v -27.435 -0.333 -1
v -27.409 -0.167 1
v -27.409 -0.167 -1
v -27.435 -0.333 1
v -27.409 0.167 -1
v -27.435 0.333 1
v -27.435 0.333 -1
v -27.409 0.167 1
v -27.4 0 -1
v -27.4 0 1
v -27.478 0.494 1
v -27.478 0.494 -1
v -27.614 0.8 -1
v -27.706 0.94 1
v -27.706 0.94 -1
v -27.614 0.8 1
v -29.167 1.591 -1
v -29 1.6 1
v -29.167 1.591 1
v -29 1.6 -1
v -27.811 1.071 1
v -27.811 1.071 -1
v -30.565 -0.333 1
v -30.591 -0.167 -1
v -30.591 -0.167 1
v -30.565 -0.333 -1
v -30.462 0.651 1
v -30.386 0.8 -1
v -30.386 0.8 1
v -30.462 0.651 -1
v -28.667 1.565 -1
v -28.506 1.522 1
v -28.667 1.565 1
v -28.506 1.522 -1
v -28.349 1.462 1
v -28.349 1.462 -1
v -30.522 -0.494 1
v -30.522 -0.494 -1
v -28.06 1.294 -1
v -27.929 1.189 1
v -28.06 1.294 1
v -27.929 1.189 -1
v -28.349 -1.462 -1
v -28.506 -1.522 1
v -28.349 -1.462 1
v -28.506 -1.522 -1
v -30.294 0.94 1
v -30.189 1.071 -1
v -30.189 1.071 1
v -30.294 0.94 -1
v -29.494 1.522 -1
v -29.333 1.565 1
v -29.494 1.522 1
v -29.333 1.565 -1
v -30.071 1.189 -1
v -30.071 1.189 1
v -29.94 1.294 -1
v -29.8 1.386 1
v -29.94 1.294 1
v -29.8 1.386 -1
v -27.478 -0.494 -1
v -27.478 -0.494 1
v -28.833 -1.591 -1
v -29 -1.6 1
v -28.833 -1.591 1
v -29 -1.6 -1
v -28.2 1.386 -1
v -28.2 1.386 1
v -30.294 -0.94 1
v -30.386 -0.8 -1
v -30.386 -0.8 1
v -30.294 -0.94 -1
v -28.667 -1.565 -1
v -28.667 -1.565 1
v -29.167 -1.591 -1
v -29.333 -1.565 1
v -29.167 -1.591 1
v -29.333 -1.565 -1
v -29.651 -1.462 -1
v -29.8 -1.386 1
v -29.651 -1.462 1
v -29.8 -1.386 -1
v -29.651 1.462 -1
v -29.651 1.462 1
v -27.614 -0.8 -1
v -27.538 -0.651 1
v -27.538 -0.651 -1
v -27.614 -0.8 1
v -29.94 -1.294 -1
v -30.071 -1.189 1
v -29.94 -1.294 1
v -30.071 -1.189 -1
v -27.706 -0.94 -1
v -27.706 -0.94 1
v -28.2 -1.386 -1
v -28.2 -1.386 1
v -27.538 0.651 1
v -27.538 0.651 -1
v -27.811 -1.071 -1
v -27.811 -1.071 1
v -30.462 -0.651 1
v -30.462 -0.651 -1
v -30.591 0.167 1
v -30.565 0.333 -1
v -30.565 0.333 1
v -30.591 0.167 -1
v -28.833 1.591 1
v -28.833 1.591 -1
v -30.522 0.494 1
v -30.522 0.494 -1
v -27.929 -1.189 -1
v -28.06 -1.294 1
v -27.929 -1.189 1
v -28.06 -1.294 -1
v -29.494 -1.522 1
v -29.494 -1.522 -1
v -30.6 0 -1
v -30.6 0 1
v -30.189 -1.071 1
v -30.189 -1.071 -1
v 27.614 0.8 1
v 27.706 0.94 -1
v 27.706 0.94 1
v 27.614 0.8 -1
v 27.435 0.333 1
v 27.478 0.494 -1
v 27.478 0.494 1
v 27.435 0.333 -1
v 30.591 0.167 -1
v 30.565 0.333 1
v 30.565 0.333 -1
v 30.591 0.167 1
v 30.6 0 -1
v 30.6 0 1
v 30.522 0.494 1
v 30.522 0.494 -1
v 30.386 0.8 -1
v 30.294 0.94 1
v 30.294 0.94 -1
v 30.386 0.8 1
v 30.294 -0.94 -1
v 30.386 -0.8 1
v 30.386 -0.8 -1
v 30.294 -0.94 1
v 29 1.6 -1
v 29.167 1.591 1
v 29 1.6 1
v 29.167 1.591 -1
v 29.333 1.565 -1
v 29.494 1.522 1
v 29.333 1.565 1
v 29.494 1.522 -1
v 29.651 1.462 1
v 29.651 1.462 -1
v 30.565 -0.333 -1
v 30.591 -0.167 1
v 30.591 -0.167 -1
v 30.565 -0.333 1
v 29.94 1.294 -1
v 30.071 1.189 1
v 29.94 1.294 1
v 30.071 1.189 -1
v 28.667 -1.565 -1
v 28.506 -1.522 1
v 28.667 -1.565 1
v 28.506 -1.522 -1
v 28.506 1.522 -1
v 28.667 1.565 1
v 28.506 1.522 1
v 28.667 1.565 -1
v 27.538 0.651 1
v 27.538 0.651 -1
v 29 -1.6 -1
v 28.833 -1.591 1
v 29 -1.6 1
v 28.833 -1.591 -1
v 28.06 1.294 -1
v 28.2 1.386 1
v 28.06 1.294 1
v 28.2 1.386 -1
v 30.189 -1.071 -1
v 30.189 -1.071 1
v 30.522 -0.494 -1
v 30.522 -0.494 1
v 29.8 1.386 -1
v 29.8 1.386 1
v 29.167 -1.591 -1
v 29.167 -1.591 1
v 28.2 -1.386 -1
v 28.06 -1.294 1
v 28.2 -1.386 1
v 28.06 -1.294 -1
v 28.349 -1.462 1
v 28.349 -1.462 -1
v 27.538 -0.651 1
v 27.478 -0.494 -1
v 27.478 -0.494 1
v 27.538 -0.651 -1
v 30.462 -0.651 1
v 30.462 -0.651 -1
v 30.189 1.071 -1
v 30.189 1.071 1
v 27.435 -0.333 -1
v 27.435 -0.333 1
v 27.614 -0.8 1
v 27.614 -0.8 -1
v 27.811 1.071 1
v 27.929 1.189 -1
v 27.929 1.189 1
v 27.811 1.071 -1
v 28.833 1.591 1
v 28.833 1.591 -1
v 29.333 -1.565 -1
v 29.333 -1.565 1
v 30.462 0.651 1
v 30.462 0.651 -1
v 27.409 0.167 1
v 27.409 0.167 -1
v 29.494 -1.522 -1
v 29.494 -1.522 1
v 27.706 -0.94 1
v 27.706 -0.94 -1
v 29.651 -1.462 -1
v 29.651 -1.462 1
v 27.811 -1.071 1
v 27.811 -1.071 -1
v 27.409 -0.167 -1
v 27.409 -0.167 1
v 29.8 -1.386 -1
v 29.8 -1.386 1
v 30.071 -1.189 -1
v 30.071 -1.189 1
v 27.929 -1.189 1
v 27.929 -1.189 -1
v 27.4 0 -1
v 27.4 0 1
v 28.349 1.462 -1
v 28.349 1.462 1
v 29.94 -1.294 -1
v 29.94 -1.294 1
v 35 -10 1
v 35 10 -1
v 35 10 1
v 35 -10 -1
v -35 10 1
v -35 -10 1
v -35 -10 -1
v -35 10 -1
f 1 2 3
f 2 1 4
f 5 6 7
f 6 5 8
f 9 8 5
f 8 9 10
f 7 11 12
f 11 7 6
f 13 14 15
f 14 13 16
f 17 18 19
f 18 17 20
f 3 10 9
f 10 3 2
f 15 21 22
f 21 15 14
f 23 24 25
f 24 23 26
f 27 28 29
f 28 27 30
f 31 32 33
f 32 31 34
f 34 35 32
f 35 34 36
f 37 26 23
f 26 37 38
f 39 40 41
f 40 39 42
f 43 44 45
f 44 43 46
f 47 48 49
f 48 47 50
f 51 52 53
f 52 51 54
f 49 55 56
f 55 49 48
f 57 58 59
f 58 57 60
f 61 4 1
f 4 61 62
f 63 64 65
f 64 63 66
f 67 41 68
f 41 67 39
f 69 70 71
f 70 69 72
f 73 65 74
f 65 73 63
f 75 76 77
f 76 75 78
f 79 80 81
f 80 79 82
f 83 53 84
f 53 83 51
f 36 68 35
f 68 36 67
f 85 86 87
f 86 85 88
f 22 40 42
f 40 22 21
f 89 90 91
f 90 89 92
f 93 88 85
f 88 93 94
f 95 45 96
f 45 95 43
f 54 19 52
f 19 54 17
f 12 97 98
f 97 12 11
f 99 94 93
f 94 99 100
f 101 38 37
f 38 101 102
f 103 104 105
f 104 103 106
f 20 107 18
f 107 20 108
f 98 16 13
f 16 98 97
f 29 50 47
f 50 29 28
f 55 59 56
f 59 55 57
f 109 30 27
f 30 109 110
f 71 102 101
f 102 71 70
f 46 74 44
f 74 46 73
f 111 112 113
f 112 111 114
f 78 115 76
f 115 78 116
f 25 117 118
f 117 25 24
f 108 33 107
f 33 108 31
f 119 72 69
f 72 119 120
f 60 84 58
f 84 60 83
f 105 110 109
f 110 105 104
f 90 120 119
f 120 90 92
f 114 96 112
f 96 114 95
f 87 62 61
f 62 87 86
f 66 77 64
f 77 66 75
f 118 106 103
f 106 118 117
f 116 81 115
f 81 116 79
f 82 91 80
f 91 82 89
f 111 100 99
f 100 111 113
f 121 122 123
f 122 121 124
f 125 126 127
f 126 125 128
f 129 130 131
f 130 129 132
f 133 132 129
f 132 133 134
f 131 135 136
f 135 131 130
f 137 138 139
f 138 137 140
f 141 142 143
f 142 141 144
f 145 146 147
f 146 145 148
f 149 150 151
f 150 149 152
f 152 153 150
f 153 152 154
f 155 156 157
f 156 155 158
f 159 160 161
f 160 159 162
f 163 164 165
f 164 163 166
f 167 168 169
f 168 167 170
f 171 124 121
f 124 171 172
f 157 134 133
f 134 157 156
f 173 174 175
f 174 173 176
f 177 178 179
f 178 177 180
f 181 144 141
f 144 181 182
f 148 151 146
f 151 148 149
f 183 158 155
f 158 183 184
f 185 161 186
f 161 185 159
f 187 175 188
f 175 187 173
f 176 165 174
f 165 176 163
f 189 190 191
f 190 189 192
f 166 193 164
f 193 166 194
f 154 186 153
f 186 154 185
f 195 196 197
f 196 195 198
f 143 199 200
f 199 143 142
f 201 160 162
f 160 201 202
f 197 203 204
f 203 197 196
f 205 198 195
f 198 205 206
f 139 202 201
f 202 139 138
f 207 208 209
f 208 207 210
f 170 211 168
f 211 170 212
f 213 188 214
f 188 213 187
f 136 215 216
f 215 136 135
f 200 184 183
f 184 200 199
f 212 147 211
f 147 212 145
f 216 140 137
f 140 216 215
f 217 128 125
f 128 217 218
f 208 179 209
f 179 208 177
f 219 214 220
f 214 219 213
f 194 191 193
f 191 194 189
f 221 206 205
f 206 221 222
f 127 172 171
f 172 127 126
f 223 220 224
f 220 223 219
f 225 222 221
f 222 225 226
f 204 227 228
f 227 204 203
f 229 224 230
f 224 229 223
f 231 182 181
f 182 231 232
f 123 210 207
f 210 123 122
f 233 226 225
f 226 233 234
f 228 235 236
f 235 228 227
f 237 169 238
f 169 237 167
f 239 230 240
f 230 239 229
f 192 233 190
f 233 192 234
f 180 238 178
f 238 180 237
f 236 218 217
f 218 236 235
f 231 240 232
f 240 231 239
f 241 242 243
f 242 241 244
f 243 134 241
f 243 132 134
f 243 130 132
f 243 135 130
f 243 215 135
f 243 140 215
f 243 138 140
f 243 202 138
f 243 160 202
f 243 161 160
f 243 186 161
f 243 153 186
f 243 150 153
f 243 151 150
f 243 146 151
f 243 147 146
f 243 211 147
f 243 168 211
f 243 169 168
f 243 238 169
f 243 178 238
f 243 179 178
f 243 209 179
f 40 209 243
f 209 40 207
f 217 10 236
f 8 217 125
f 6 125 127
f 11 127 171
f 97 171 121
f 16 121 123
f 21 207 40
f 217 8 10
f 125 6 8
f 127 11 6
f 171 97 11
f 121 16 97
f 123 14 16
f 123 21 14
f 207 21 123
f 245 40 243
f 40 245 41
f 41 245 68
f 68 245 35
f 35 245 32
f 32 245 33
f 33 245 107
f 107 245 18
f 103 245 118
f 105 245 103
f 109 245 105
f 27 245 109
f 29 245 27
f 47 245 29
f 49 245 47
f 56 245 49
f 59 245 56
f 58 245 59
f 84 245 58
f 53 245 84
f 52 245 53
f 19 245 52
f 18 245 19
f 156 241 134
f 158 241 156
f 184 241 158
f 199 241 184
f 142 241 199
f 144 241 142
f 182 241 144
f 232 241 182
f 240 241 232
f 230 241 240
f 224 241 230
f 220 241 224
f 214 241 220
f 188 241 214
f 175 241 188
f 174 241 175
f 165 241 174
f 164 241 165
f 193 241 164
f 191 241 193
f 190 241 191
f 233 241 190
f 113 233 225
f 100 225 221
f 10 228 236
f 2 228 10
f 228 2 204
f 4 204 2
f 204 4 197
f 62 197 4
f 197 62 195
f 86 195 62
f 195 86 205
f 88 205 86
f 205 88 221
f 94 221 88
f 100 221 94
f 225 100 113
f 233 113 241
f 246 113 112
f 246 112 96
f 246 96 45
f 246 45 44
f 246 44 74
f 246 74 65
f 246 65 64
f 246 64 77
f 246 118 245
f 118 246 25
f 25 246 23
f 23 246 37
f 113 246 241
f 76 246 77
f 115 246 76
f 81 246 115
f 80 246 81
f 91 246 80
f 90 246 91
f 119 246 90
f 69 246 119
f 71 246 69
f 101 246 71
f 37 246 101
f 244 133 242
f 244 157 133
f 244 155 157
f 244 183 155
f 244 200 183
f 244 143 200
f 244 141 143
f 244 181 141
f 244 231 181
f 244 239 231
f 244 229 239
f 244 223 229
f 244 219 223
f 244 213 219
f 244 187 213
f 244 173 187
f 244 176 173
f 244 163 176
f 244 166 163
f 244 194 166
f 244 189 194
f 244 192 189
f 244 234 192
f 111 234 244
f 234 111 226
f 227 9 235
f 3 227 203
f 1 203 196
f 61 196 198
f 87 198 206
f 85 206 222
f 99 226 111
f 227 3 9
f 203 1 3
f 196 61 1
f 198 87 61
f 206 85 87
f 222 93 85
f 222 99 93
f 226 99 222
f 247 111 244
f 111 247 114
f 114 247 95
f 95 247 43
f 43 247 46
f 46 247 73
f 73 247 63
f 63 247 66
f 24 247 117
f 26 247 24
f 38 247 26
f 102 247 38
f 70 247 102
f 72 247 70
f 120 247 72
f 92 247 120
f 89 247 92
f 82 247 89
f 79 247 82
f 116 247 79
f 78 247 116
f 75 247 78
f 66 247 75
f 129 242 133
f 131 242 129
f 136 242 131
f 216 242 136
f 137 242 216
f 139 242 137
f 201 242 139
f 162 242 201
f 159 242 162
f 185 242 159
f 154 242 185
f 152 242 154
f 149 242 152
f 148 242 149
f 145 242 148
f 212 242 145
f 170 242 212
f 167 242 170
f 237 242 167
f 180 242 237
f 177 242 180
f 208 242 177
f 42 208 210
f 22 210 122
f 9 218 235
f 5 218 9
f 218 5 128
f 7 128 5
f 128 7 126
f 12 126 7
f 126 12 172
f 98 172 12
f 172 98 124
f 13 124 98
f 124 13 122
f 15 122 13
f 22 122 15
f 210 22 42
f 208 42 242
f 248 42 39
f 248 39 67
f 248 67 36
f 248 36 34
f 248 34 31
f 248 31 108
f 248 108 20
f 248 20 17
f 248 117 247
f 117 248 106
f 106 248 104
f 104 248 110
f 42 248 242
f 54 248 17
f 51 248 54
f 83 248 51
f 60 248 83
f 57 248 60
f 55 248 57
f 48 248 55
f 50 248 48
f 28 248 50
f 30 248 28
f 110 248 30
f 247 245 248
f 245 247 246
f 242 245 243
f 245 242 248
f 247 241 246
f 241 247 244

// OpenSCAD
// Engraving-ready nameplate.
$fn = 60;
eps = 0.02;
length = 70;
width = 20;
thickness = 2;
difference() { cube([length,width,thickness],center=true); for(x=[-length/2+6,length/2-6]) translate([x,0,-thickness/2-eps]) cylinder(d=3.2,h=thickness+2*eps); }
